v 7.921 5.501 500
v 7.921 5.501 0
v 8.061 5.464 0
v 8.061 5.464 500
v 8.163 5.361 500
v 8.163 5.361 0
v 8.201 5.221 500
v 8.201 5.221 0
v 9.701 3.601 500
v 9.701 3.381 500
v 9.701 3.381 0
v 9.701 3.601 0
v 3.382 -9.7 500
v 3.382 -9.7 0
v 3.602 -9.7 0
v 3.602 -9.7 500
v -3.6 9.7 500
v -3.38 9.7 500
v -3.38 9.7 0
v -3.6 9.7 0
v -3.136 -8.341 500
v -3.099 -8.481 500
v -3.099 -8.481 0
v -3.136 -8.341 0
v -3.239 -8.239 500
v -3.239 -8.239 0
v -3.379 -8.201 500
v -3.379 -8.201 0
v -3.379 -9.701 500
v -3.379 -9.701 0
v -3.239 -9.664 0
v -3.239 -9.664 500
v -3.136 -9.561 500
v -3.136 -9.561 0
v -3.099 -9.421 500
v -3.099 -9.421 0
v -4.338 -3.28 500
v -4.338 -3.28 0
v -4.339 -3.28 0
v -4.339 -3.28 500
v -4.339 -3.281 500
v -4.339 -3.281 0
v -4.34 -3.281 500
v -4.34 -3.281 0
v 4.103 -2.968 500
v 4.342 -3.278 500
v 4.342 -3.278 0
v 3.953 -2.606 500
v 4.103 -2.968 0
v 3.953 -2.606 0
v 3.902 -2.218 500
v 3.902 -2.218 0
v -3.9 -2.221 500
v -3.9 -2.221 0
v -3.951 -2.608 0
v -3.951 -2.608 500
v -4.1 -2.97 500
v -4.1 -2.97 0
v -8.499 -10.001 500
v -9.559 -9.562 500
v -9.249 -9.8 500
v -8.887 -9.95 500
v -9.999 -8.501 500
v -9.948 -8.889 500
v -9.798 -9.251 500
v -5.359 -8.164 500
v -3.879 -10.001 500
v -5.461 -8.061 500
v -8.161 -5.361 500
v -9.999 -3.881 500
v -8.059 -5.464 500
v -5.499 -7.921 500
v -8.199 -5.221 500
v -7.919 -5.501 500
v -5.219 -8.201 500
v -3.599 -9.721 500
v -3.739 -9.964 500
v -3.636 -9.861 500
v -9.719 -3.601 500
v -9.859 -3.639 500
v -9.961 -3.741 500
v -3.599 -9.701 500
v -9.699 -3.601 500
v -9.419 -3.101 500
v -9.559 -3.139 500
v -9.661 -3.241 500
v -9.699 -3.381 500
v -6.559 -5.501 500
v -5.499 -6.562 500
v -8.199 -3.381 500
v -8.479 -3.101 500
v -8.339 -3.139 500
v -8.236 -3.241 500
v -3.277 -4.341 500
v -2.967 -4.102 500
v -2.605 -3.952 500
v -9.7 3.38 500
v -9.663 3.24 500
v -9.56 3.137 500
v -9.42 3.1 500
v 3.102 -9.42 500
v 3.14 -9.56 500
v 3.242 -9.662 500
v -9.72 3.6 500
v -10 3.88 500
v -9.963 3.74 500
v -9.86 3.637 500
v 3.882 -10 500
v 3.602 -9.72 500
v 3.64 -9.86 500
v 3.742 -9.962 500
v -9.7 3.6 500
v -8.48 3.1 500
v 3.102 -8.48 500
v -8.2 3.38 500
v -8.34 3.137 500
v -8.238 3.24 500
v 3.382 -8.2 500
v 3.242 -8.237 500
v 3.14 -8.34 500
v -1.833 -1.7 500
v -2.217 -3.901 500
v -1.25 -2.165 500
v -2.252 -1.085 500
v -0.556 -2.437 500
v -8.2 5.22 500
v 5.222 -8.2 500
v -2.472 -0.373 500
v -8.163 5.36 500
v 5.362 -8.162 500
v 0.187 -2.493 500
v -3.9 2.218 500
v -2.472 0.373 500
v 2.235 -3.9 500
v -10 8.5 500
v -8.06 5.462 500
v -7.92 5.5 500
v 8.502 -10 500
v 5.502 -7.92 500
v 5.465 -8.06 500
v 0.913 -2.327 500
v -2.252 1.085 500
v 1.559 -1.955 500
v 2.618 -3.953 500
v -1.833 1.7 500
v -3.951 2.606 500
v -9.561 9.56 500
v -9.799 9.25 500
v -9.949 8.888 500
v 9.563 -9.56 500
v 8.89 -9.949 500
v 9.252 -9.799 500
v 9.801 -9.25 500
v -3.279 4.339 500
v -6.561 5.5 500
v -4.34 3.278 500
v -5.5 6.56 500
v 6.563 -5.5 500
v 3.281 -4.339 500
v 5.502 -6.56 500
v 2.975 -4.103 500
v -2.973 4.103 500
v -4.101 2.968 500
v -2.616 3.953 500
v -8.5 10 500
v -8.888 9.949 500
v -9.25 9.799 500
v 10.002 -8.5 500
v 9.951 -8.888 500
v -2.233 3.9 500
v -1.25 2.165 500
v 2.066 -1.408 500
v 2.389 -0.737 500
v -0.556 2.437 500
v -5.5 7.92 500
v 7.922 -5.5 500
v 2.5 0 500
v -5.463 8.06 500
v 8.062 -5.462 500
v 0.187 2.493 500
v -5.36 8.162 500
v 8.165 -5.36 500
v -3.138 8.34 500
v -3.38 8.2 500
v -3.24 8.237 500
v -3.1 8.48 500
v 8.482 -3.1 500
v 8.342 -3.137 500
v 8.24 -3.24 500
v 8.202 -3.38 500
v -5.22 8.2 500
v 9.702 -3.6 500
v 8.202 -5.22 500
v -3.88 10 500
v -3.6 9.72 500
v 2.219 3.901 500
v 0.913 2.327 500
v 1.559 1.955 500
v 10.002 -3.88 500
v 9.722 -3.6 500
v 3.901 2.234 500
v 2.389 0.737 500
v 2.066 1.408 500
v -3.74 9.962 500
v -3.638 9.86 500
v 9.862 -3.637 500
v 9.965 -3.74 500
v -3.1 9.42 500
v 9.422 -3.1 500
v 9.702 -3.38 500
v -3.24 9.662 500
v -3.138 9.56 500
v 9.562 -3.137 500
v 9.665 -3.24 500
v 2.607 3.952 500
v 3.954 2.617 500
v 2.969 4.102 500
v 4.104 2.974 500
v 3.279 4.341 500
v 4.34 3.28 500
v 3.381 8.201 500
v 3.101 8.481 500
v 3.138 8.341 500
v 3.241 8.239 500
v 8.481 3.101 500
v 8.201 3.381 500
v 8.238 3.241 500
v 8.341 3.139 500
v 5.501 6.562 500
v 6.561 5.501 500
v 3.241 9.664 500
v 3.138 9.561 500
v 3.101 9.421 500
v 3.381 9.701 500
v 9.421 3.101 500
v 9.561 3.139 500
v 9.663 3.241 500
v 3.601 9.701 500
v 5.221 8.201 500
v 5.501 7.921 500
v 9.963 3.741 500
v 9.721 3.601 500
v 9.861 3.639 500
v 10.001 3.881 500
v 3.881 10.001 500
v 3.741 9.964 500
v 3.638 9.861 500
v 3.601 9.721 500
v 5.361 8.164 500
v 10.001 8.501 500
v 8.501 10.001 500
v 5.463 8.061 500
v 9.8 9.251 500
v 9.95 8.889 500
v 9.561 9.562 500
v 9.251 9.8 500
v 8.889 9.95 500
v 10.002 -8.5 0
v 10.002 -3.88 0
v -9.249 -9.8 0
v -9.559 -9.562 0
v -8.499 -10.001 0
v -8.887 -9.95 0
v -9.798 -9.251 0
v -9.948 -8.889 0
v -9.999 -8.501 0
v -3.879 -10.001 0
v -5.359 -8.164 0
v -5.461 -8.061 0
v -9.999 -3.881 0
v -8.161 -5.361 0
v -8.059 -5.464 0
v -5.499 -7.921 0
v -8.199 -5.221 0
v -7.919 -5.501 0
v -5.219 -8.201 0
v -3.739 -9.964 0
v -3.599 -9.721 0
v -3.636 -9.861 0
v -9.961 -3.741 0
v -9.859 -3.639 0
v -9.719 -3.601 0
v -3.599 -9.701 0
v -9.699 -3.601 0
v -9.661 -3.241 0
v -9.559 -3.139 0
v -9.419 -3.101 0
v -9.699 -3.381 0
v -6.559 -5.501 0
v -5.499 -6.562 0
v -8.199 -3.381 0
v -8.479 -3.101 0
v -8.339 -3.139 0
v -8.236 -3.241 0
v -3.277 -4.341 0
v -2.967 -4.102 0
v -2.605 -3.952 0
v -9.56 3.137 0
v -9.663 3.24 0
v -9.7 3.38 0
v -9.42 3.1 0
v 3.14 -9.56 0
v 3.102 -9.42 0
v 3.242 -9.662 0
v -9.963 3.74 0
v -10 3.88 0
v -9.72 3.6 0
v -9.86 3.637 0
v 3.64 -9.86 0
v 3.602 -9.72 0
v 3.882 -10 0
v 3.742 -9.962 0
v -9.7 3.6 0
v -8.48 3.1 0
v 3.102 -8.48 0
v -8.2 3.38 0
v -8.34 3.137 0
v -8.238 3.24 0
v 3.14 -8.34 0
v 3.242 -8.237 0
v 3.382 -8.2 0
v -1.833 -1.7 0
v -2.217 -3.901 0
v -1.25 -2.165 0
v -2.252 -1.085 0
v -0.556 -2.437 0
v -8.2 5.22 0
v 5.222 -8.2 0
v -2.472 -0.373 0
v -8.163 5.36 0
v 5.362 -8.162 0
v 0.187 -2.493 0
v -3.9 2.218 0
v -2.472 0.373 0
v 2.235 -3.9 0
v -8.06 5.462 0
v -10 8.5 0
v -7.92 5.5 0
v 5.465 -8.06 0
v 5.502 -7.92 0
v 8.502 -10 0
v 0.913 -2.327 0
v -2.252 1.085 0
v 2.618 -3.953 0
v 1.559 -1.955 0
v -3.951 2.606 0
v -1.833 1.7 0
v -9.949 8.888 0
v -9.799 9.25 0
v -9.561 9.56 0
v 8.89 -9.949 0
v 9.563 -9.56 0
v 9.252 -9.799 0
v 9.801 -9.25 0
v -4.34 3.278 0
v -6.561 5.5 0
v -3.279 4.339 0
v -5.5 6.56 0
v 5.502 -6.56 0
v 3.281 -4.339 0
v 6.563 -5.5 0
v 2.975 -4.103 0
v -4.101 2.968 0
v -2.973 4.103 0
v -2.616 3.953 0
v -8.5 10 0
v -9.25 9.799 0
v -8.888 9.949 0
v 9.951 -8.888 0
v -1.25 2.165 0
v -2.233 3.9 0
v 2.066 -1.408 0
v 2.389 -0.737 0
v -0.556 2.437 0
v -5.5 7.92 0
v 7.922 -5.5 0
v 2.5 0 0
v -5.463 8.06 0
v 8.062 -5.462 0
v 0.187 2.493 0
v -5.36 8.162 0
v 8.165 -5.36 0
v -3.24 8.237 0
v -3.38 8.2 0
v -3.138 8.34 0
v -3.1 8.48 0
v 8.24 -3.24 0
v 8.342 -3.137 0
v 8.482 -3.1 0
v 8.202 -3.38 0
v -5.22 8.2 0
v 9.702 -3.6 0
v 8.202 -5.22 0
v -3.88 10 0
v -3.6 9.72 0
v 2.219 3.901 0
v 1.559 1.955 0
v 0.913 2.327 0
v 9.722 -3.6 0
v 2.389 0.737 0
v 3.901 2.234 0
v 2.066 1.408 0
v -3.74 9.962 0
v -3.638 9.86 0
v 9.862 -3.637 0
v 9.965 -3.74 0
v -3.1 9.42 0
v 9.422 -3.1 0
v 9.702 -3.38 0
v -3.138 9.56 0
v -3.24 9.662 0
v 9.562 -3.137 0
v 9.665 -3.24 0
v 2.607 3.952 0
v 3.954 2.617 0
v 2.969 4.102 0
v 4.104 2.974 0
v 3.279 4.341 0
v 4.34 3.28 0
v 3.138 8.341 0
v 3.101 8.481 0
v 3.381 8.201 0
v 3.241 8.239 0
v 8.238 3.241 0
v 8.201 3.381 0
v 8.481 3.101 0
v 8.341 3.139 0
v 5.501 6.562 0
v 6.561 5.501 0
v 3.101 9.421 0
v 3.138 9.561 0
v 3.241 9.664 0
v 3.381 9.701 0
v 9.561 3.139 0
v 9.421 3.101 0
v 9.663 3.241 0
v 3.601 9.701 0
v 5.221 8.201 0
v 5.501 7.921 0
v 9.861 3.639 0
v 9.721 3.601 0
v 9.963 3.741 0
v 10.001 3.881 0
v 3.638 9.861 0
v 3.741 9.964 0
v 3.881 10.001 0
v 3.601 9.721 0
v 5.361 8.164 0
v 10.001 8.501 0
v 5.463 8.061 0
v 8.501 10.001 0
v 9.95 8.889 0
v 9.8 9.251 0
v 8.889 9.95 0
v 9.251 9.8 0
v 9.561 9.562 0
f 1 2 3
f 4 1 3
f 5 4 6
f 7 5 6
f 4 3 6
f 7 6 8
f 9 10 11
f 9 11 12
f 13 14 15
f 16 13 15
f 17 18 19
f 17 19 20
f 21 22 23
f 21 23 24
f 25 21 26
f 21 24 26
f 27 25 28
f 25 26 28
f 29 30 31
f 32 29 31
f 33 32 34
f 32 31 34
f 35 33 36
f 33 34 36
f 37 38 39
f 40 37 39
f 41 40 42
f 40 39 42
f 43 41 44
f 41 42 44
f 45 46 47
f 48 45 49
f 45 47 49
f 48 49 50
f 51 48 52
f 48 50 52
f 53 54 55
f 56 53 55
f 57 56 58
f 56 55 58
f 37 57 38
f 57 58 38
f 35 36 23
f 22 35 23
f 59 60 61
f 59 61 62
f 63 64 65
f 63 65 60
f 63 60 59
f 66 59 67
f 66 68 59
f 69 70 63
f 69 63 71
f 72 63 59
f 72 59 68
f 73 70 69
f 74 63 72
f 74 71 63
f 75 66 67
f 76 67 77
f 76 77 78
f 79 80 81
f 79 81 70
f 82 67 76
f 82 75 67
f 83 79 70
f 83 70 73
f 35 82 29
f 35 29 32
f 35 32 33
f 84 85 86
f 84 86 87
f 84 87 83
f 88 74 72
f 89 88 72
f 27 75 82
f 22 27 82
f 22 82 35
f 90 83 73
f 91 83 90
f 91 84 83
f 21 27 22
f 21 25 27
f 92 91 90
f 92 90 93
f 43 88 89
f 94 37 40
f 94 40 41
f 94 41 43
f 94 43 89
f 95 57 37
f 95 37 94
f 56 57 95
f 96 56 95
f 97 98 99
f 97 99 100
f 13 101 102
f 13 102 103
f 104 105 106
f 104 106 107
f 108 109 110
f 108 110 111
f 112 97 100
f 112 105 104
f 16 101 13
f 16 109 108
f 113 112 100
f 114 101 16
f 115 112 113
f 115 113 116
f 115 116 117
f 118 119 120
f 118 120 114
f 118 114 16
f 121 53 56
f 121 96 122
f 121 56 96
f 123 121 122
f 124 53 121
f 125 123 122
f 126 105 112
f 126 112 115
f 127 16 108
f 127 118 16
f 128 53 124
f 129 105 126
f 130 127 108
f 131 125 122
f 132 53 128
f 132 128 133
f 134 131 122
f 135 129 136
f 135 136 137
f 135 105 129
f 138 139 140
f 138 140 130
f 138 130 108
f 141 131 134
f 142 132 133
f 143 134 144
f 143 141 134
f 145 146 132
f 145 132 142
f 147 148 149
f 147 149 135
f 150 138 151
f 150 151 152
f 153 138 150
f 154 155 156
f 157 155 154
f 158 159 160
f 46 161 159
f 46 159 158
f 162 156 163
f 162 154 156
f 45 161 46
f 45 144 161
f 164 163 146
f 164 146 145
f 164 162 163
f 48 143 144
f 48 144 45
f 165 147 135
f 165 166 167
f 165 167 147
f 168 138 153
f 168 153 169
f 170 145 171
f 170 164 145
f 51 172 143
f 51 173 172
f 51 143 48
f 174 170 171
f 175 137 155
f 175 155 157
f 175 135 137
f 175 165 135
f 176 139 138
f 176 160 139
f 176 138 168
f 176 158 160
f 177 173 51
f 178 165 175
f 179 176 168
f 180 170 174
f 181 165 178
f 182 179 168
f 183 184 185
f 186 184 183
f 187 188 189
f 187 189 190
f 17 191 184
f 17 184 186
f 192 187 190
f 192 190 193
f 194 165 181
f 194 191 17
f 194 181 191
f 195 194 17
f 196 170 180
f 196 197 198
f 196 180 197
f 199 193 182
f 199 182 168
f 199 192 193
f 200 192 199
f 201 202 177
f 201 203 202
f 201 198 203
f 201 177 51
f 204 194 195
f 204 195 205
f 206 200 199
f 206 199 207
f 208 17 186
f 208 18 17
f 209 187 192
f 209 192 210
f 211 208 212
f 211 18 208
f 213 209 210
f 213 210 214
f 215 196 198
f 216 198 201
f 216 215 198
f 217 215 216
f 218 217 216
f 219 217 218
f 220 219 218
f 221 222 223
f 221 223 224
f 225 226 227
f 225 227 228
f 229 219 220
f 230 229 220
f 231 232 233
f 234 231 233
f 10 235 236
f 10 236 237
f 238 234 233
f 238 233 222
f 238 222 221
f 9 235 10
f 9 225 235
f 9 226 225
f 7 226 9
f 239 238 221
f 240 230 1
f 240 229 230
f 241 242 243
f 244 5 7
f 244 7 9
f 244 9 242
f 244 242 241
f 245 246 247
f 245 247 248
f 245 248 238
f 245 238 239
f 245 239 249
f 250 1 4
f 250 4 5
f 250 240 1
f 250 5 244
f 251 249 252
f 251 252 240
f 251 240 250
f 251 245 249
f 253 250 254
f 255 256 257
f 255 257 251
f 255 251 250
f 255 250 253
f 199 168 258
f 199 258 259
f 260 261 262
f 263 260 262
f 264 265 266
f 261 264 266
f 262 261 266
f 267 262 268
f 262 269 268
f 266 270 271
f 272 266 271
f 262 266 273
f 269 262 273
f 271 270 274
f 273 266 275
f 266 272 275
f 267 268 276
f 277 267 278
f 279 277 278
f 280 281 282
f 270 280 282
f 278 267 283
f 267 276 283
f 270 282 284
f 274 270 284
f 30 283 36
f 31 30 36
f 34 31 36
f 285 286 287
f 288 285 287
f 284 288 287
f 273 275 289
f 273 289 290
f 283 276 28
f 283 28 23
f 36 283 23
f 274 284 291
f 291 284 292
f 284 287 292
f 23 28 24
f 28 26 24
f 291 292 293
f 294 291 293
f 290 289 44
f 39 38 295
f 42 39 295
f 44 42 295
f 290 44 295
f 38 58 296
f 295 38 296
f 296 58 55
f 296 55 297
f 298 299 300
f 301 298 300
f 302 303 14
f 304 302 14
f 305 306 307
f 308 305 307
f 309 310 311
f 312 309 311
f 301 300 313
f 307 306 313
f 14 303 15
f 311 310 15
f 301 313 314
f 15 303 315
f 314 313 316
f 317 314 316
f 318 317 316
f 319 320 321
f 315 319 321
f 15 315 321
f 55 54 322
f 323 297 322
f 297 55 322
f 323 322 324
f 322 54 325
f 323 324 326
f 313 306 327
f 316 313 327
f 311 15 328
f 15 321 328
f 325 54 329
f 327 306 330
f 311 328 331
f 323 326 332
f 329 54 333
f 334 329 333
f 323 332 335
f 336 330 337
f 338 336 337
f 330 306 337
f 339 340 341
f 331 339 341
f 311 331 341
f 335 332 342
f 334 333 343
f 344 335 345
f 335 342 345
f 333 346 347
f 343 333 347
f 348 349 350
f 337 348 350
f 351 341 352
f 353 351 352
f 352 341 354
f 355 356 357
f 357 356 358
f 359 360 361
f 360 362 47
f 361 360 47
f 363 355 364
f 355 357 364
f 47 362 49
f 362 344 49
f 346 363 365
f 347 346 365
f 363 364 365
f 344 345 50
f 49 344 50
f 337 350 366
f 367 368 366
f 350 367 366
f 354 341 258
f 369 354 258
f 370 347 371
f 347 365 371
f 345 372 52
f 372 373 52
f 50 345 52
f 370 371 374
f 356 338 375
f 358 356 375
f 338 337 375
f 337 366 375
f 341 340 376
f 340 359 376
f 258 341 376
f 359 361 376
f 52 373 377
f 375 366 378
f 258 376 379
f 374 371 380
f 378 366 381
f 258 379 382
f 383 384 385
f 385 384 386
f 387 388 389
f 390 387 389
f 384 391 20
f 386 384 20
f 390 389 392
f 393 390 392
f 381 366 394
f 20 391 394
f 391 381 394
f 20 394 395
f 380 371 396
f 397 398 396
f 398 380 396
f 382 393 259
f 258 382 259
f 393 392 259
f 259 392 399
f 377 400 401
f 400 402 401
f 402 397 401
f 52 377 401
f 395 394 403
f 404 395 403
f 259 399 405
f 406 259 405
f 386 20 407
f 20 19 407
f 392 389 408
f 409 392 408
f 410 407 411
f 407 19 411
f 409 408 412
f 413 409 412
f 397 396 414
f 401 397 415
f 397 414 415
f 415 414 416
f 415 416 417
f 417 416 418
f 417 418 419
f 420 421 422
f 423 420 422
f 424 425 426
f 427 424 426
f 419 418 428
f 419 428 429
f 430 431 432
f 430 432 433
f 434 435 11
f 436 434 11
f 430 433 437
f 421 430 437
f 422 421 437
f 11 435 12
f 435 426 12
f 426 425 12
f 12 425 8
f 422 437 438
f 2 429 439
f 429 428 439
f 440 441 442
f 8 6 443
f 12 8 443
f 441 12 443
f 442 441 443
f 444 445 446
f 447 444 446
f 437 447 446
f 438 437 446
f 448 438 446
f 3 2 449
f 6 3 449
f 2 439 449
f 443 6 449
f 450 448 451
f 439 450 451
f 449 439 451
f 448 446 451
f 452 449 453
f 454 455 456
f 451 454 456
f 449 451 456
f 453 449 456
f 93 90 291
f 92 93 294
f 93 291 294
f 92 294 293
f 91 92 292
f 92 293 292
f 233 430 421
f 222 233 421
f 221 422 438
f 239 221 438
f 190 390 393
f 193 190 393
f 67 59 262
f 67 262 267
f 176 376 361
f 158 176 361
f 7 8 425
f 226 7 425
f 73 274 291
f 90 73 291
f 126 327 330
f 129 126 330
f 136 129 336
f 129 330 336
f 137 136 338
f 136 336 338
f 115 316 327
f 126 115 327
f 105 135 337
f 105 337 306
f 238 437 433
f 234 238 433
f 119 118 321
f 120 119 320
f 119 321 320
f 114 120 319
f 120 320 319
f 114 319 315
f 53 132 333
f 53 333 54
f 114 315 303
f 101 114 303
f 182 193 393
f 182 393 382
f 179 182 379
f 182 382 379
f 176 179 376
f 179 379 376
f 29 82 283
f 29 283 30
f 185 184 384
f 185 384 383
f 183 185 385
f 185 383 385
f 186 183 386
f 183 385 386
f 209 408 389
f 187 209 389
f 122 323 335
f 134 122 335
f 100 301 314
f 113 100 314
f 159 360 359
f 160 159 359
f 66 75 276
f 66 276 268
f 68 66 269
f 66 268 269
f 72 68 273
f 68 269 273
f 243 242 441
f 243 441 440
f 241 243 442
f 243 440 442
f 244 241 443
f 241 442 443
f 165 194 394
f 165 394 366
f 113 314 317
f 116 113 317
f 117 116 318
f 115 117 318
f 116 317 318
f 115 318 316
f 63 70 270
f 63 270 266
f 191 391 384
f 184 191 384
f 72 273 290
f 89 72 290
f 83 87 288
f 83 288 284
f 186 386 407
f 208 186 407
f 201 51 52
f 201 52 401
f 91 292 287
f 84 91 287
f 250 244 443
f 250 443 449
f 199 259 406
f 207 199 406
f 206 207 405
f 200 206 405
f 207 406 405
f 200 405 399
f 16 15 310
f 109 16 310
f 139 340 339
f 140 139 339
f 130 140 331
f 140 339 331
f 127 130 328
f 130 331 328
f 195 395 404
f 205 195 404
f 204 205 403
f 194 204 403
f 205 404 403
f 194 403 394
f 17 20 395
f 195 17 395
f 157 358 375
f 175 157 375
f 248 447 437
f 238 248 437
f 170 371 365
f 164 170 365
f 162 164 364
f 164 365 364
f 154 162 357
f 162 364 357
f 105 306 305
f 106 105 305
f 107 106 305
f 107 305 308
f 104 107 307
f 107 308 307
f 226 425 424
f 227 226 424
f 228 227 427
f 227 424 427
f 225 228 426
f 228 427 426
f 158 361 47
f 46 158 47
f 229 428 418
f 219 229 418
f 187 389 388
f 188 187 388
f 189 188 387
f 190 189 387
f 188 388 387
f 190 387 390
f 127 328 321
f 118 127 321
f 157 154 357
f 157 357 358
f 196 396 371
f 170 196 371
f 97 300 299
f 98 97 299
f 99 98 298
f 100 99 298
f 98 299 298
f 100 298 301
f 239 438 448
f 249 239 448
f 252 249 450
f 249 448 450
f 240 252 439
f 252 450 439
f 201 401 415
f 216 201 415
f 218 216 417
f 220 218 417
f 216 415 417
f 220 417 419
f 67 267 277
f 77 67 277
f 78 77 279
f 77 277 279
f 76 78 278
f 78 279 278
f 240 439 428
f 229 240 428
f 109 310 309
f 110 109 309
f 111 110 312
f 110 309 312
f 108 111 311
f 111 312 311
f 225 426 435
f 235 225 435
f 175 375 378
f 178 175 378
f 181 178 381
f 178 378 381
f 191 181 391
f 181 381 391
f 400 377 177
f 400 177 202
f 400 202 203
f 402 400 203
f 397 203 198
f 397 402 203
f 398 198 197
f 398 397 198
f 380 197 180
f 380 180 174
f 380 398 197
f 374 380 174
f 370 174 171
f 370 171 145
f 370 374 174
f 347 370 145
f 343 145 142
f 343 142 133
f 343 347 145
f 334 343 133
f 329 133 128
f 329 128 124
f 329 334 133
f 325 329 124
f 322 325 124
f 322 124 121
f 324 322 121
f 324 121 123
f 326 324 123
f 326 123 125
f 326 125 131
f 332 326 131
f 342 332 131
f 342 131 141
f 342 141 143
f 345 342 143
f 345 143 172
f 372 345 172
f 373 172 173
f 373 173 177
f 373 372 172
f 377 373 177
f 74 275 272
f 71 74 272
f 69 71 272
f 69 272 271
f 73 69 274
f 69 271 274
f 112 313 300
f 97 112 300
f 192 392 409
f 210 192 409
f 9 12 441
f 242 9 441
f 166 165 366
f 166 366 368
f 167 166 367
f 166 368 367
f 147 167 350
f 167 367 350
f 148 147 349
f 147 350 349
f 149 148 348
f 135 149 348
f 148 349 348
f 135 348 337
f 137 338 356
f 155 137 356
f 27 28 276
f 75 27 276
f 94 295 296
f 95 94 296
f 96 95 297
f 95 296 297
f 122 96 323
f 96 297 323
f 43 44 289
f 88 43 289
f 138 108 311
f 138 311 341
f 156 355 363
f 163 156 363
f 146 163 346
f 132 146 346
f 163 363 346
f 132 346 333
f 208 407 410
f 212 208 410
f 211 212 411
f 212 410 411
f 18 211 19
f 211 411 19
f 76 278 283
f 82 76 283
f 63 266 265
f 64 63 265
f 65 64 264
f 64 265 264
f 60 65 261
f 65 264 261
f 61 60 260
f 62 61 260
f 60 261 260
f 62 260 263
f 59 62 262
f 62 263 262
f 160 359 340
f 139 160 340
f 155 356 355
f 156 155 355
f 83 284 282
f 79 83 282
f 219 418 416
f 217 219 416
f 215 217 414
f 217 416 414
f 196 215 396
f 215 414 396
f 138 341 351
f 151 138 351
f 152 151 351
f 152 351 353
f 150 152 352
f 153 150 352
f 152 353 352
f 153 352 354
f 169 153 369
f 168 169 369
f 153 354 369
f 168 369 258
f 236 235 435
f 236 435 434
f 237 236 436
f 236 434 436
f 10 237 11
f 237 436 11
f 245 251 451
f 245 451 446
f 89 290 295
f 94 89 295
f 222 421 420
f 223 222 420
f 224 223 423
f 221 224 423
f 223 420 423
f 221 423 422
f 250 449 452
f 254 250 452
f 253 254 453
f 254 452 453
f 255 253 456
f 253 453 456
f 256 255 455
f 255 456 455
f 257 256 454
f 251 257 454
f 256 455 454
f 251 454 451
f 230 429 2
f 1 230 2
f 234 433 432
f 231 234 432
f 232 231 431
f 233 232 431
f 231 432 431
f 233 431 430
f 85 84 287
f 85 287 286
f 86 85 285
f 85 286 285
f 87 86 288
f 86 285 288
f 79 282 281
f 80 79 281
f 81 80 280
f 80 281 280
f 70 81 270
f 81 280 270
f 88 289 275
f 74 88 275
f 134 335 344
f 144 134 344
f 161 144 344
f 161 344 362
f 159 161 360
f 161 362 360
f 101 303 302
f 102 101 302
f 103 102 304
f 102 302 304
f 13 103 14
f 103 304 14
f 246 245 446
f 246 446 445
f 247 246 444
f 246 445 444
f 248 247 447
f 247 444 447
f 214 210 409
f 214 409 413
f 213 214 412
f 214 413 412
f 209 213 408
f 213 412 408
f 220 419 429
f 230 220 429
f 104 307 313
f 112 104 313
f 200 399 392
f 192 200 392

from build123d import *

# Parameters (mm, degrees)
BOSS_EXTRUDE1_DEPTH = 500
F_3DSKETCH2_R       = 2.5
CUT_EXTRUDE1_DEPTH  = 501.200028064


with BuildPart() as part:
    # Sketch1 → Boss-Extrude1 (new body)
    with BuildSketch(Plane.XY):
        with BuildLine():
            ThreePointArc((-4.339541497, 3.27832502), (-4.01438237, 2.791689997), (-3.900201668, 2.217664848))
            Line((-3.900201668, 2.217664848), (-3.900201668, -2.220777458))
            ThreePointArc((-3.900201668, -2.220777458), (-4.013982246, -2.793835668), (-4.338062619, -3.279956687))
            ThreePointArc((-4.338062619, -3.279956687), (-4.338801799, -3.280697416), (-4.339541497, -3.28143763))
            Line((-4.339541497, -3.28143763), (-6.559305445, -5.501201578))
            Line((-6.559305445, -5.501201578), (-7.918645273, -5.501201578))
            ThreePointArc((-7.918645273, -5.501201578), (-8.116635172, -5.419191476), (-8.198645273, -5.221201578))
            Line((-8.198645273, -5.221201578), (-8.198645273, -3.381201578))
            ThreePointArc((-8.198645273, -3.381201578), (-8.280655374, -3.183211679), (-8.478645273, -3.101201578))
            Line((-8.478645273, -3.101201578), (-9.418645273, -3.101201578))
            ThreePointArc((-9.418645273, -3.101201578), (-9.616635172, -3.183211679), (-9.698645273, -3.381201578))
            Line((-9.698645273, -3.381201578), (-9.698645273, -3.601201578))
            Line((-9.698645273, -3.601201578), (-9.718645273, -3.601201578))
            ThreePointArc((-9.718645273, -3.601201578), (-9.916635172, -3.683211679), (-9.998645273, -3.881201578))
            Line((-9.998645273, -3.881201578), (-9.998645273, -8.501201578))
            ThreePointArc((-9.998645273, -8.501201578), (-9.559305445, -9.561861749), (-8.498645273, -10.001201578))
            Line((-8.498645273, -10.001201578), (-3.878645273, -10.001201578))
            ThreePointArc((-3.878645273, -10.001201578), (-3.680655374, -9.919191476), (-3.598645273, -9.721201578))
            Line((-3.598645273, -9.721201578), (-3.598645273, -9.701201578))
            Line((-3.598645273, -9.701201578), (-3.378645273, -9.701201578))
            ThreePointArc((-3.378645273, -9.701201578), (-3.180655374, -9.619191476), (-3.098645273, -9.421201578))
            Line((-3.098645273, -9.421201578), (-3.098645273, -8.481201578))
            ThreePointArc((-3.098645273, -8.481201578), (-3.180655374, -8.283211679), (-3.378645273, -8.201201578))
            Line((-3.378645273, -8.201201578), (-5.218645273, -8.201201578))
            ThreePointArc((-5.218645273, -8.201201578), (-5.416635172, -8.119191476), (-5.498645273, -7.921201578))
            Line((-5.498645273, -7.921201578), (-5.498645273, -6.561861749))
            Line((-5.498645273, -6.561861749), (-3.277324929, -4.340541406))
            ThreePointArc((-3.277324929, -4.340541406), (-2.790689906, -4.015382279), (-2.216664757, -3.901201578))
            Line((-2.216664757, -3.901201578), (2.234977304, -3.899793498))
            ThreePointArc((2.234977304, -3.899793498), (2.801097117, -4.016727825), (3.280957809, -4.339061494))
            Line((3.280957809, -4.339061494), (5.502201668, -6.560305354))
            Line((5.502201668, -6.560305354), (5.502201668, -7.919645182))
            ThreePointArc((5.502201668, -7.919645182), (5.420191567, -8.117635081), (5.222201668, -8.199645182))
            Line((5.222201668, -8.199645182), (3.382201668, -8.199645182))
            ThreePointArc((3.382201668, -8.199645182), (3.18421177, -8.281655283), (3.102201668, -8.479645182))
            Line((3.102201668, -8.479645182), (3.102201668, -9.419645182))
            ThreePointArc((3.102201668, -9.419645182), (3.18421177, -9.617635081), (3.382201668, -9.699645182))
            Line((3.382201668, -9.699645182), (3.602201668, -9.699645182))
            Line((3.602201668, -9.699645182), (3.602201668, -9.719645182))
            ThreePointArc((3.602201668, -9.719645182), (3.68421177, -9.917635081), (3.882201668, -9.999645182))
            Line((3.882201668, -9.999645182), (8.502201668, -9.999645182))
            ThreePointArc((8.502201668, -9.999645182), (9.56286184, -9.560305354), (10.002201668, -8.499645182))
            Line((10.002201668, -8.499645182), (10.002201668, -3.879645182))
            ThreePointArc((10.002201668, -3.879645182), (9.920191567, -3.681655283), (9.722201668, -3.599645182))
            Line((9.722201668, -3.599645182), (9.702201668, -3.599645182))
            Line((9.702201668, -3.599645182), (9.702201668, -3.379645182))
            ThreePointArc((9.702201668, -3.379645182), (9.620191567, -3.181655283), (9.422201668, -3.099645182))
            Line((9.422201668, -3.099645182), (8.482201668, -3.099645182))
            ThreePointArc((8.482201668, -3.099645182), (8.28421177, -3.181655283), (8.202201668, -3.379645182))
            Line((8.202201668, -3.379645182), (8.202201668, -5.219645182))
            ThreePointArc((8.202201668, -5.219645182), (8.120191567, -5.417635081), (7.922201668, -5.499645182))
            Line((7.922201668, -5.499645182), (6.56286184, -5.499645182))
            Line((6.56286184, -5.499645182), (4.341541497, -3.278324838))
            ThreePointArc((4.341541497, -3.278324838), (4.01638237, -2.791689815), (3.902201668, -2.217664667))
            Line((3.902201668, -2.217664667), (3.900793589, 2.233977395))
            ThreePointArc((3.900793589, 2.233977395), (4.017727916, 2.800097207), (4.340061585, 3.2799579))
            Line((4.340061585, 3.2799579), (6.561305445, 5.501201759))
            Line((6.561305445, 5.501201759), (7.920645273, 5.501201759))
            ThreePointArc((7.920645273, 5.501201759), (8.118635172, 5.419191658), (8.200645273, 5.221201759))
            Line((8.200645273, 5.221201759), (8.200645273, 3.381201759))
            ThreePointArc((8.200645273, 3.381201759), (8.282655374, 3.183211861), (8.480645273, 3.101201759))
            Line((8.480645273, 3.101201759), (9.420645273, 3.101201759))
            ThreePointArc((9.420645273, 3.101201759), (9.618635172, 3.183211861), (9.700645273, 3.381201759))
            Line((9.700645273, 3.381201759), (9.700645273, 3.601201759))
            Line((9.700645273, 3.601201759), (9.720645273, 3.601201759))
            ThreePointArc((9.720645273, 3.601201759), (9.918635172, 3.683211861), (10.000645273, 3.881201759))
            Line((10.000645273, 3.881201759), (10.000645273, 8.501201759))
            ThreePointArc((10.000645273, 8.501201759), (9.561305445, 9.561861931), (8.500645273, 10.001201759))
            Line((8.500645273, 10.001201759), (3.880645273, 10.001201759))
            ThreePointArc((3.880645273, 10.001201759), (3.682655374, 9.919191658), (3.600645273, 9.721201759))
            Line((3.600645273, 9.721201759), (3.600645273, 9.701201759))
            Line((3.600645273, 9.701201759), (3.380645273, 9.701201759))
            ThreePointArc((3.380645273, 9.701201759), (3.182655374, 9.619191658), (3.100645273, 9.421201759))
            Line((3.100645273, 9.421201759), (3.100645273, 8.481201759))
            ThreePointArc((3.100645273, 8.481201759), (3.182655374, 8.283211861), (3.380645273, 8.201201759))
            Line((3.380645273, 8.201201759), (5.220645273, 8.201201759))
            ThreePointArc((5.220645273, 8.201201759), (5.418635172, 8.119191658), (5.500645273, 7.921201759))
            Line((5.500645273, 7.921201759), (5.500645273, 6.561861931))
            Line((5.500645273, 6.561861931), (3.279324929, 4.340541588))
            ThreePointArc((3.279324929, 4.340541588), (2.792689906, 4.015382461), (2.218664757, 3.901201759))
            Line((2.218664757, 3.901201759), (-2.232977304, 3.89979368))
            ThreePointArc((-2.232977304, 3.89979368), (-2.799097117, 4.016728006), (-3.278957809, 4.339061676))
            Line((-3.278957809, 4.339061676), (-5.500201668, 6.560305535))
            Line((-5.500201668, 6.560305535), (-5.500201668, 7.919645364))
            ThreePointArc((-5.500201668, 7.919645364), (-5.418191567, 8.117635262), (-5.220201668, 8.199645364))
            Line((-5.220201668, 8.199645364), (-3.380201668, 8.199645364))
            ThreePointArc((-3.380201668, 8.199645364), (-3.18221177, 8.281655465), (-3.100201668, 8.479645364))
            Line((-3.100201668, 8.479645364), (-3.100201668, 9.419645364))
            ThreePointArc((-3.100201668, 9.419645364), (-3.18221177, 9.617635262), (-3.380201668, 9.699645364))
            Line((-3.380201668, 9.699645364), (-3.600201668, 9.699645364))
            Line((-3.600201668, 9.699645364), (-3.600201668, 9.719645364))
            ThreePointArc((-3.600201668, 9.719645364), (-3.68221177, 9.917635262), (-3.880201668, 9.999645364))
            Line((-3.880201668, 9.999645364), (-8.500201668, 9.999645364))
            ThreePointArc((-8.500201668, 9.999645364), (-9.56086184, 9.560305535), (-10.000201668, 8.499645364))
            Line((-10.000201668, 8.499645364), (-10.000201668, 3.879645364))
            ThreePointArc((-10.000201668, 3.879645364), (-9.918191567, 3.681655465), (-9.720201668, 3.599645364))
            Line((-9.720201668, 3.599645364), (-9.700201668, 3.599645364))
            Line((-9.700201668, 3.599645364), (-9.700201668, 3.379645364))
            ThreePointArc((-9.700201668, 3.379645364), (-9.618191567, 3.181655465), (-9.420201668, 3.099645364))
            Line((-9.420201668, 3.099645364), (-8.480201668, 3.099645364))
            ThreePointArc((-8.480201668, 3.099645364), (-8.28221177, 3.181655465), (-8.200201668, 3.379645364))
            Line((-8.200201668, 3.379645364), (-8.200201668, 5.219645364))
            ThreePointArc((-8.200201668, 5.219645364), (-8.118191567, 5.417635262), (-7.920201668, 5.499645364))
            Line((-7.920201668, 5.499645364), (-6.56086184, 5.499645364))
            Line((-6.56086184, 5.499645364), (-4.339541497, 3.27832502))
        make_face()
    extrude(amount=BOSS_EXTRUDE1_DEPTH)

    # 3DSketch2 → Cut-Extrude1 (cut, through all)
    with BuildSketch(Plane.XY):
        Circle(F_3DSKETCH2_R)
    extrude(amount=CUT_EXTRUDE1_DEPTH, mode=Mode.SUBTRACT)


solid = part.part
